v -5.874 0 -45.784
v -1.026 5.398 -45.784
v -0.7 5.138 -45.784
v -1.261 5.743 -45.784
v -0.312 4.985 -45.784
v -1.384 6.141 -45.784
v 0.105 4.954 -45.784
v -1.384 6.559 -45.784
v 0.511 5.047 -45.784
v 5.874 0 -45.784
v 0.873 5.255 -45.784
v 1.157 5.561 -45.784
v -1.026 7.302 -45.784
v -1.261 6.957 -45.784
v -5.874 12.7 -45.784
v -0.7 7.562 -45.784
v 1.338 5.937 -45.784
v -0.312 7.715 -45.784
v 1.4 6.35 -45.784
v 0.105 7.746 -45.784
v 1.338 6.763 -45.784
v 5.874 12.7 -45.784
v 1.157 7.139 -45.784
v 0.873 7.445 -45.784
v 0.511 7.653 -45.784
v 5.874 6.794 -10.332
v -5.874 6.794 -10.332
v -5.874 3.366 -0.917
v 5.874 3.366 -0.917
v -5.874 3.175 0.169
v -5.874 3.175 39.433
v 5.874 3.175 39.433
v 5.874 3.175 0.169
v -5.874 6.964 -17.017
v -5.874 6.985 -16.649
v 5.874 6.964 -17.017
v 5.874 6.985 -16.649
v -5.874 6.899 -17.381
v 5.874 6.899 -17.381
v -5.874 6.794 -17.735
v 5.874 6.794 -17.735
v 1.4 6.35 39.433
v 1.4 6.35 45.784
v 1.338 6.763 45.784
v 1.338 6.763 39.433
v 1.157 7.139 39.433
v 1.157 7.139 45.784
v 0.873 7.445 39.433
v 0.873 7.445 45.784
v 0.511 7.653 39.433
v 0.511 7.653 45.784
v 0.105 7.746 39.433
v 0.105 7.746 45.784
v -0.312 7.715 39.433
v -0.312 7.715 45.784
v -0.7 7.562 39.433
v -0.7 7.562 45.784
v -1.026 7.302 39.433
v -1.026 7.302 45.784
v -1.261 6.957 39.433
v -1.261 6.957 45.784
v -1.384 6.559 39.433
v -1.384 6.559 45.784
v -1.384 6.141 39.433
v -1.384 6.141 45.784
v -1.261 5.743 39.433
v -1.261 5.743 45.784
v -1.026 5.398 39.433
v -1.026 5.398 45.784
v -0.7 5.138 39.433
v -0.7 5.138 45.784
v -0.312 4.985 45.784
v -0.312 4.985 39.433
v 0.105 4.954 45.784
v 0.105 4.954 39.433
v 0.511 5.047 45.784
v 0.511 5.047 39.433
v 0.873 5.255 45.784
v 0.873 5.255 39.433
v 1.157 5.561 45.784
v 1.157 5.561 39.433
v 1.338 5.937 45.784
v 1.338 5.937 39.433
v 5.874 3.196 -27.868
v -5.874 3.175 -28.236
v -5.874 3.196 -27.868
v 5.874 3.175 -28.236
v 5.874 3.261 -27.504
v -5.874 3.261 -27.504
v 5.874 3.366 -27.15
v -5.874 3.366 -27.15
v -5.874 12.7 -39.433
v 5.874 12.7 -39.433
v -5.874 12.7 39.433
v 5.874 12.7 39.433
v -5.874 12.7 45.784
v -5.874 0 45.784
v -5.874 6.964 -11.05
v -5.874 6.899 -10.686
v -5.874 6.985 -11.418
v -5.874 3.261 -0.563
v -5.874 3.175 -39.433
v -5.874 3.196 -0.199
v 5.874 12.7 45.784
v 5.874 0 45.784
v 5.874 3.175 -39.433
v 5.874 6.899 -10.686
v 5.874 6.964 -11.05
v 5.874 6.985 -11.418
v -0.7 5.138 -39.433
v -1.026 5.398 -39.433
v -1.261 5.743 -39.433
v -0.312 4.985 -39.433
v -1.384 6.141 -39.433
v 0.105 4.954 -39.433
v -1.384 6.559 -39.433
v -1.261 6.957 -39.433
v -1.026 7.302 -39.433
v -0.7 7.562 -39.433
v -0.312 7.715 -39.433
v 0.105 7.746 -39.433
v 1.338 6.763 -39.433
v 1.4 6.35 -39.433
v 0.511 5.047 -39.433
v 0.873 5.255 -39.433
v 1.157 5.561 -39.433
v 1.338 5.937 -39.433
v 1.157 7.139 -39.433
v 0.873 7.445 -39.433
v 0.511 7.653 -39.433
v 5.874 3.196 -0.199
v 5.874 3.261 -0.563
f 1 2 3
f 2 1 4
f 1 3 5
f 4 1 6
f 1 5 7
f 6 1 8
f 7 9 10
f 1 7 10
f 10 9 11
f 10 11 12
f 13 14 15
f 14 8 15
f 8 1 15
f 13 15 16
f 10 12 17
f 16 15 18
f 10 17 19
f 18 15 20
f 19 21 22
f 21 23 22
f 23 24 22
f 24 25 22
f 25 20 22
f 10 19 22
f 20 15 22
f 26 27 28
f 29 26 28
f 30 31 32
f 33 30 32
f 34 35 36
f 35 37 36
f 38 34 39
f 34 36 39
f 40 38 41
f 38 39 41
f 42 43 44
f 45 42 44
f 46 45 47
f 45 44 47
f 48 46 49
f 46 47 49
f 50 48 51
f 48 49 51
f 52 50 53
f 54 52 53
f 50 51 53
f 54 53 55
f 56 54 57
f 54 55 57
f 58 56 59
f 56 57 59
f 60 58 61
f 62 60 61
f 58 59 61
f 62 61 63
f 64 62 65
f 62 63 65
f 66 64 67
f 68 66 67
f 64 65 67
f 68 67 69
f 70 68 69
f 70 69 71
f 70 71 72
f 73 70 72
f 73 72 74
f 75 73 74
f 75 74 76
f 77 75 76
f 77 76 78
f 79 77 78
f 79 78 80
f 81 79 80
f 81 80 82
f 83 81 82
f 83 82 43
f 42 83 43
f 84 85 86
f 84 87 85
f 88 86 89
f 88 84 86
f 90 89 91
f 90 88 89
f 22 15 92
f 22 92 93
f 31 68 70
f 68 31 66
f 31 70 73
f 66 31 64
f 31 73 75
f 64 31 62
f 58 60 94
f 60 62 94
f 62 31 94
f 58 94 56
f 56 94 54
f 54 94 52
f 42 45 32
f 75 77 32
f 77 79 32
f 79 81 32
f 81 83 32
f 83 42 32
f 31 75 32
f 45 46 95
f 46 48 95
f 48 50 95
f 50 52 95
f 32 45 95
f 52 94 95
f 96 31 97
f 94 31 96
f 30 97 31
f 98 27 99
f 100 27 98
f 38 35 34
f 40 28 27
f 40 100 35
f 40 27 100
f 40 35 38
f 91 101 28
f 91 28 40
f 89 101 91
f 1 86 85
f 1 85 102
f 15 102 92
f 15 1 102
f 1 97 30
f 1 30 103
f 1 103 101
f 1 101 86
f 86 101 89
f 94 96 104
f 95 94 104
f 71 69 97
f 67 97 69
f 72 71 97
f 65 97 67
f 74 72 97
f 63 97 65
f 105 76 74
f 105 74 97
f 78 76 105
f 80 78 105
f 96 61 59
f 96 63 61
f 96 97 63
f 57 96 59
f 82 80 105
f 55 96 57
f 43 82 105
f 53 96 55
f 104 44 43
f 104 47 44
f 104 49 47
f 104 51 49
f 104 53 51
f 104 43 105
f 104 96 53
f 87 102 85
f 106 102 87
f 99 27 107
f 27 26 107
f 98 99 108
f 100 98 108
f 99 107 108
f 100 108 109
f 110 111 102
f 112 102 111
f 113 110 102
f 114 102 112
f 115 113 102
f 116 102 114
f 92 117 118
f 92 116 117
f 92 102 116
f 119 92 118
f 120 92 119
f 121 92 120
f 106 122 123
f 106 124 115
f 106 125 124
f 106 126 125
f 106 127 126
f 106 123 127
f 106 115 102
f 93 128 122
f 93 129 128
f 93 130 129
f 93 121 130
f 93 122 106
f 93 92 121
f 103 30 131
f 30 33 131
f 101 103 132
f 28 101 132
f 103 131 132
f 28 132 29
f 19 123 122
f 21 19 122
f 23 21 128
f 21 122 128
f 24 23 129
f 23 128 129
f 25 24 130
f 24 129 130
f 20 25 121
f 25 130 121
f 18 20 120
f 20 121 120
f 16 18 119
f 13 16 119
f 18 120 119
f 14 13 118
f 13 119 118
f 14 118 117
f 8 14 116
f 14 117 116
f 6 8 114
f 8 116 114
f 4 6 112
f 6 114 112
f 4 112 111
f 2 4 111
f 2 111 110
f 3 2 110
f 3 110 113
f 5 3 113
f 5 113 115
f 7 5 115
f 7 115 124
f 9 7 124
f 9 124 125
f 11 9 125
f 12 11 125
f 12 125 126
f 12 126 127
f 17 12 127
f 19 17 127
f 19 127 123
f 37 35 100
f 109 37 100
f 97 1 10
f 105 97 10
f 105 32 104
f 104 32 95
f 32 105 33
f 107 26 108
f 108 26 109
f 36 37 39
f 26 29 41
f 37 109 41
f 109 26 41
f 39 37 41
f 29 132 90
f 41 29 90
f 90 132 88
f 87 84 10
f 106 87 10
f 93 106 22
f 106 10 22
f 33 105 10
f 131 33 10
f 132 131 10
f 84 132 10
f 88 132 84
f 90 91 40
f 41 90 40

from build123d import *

# Parameters (mm, degrees)
SKETCH1_W           = 11.7475
SKETCH1_H           = 91.567
BOSS_EXTRUDE1_DEPTH = 3.175
SKETCH5_W           = 11.7475
SKETCH5_H           = 9.525
BOSS_EXTRUDE2_DEPTH = 6.35
SKETCH4_R           = 1.399999994
CUT_EXTRUDE1_DEPTH  = 92.567
BOSS_EXTRUDE3_DEPTH = 11.7475
FILLET1_R           = 3.175


with BuildPart() as part:
    # Sketch1 → Boss-Extrude1 (new body)
    with BuildSketch(Plane(origin=(0, 0, 0), x_dir=(1, 0, 0), z_dir=(0, 1, 0))):
        Rectangle(SKETCH1_W, SKETCH1_H)
    extrude(amount=BOSS_EXTRUDE1_DEPTH)

    # Sketch5 → Boss-Extrude2 (add)
    with BuildSketch(Plane.XY.offset(45.7835)):
        with Locations((0, 7.9375)):
            Rectangle(SKETCH5_W, SKETCH5_H)
    boss_extrude2 = extrude(amount=-BOSS_EXTRUDE2_DEPTH)

    # Mirror1: Boss-Extrude2 across plane
    add(boss_extrude2.mirror(Plane.XY))

    # Sketch4 → Cut-Extrude1 (cut, through all)
    with BuildSketch(Plane.XY.offset(45.7835)):
        with Locations((0, 6.35)):
            Circle(SKETCH4_R)
    extrude(amount=-CUT_EXTRUDE1_DEPTH, mode=Mode.SUBTRACT)

    # Sketch6 → Boss-Extrude3 (add)
    with BuildSketch(Plane.ZY.offset(5.87375)):
        Polygon((-17.2085, 6.985), (-10.8585, 6.985), (-0.390611032, 3.175), (-27.676388968, 3.175), align=None)
    extrude(amount=-BOSS_EXTRUDE3_DEPTH)

    # Fillet1
    fillet1_edges = [part.edges().sort_by_distance(p)[0] for p in [
        (0, 3.175, -27.676388968),
        (0, 6.985, -17.2085),
        (0, 6.985, -10.8585),
        (0, 3.175, -0.390611032),
    ]]
    fillet(fillet1_edges, radius=FILLET1_R)


solid = part.part
